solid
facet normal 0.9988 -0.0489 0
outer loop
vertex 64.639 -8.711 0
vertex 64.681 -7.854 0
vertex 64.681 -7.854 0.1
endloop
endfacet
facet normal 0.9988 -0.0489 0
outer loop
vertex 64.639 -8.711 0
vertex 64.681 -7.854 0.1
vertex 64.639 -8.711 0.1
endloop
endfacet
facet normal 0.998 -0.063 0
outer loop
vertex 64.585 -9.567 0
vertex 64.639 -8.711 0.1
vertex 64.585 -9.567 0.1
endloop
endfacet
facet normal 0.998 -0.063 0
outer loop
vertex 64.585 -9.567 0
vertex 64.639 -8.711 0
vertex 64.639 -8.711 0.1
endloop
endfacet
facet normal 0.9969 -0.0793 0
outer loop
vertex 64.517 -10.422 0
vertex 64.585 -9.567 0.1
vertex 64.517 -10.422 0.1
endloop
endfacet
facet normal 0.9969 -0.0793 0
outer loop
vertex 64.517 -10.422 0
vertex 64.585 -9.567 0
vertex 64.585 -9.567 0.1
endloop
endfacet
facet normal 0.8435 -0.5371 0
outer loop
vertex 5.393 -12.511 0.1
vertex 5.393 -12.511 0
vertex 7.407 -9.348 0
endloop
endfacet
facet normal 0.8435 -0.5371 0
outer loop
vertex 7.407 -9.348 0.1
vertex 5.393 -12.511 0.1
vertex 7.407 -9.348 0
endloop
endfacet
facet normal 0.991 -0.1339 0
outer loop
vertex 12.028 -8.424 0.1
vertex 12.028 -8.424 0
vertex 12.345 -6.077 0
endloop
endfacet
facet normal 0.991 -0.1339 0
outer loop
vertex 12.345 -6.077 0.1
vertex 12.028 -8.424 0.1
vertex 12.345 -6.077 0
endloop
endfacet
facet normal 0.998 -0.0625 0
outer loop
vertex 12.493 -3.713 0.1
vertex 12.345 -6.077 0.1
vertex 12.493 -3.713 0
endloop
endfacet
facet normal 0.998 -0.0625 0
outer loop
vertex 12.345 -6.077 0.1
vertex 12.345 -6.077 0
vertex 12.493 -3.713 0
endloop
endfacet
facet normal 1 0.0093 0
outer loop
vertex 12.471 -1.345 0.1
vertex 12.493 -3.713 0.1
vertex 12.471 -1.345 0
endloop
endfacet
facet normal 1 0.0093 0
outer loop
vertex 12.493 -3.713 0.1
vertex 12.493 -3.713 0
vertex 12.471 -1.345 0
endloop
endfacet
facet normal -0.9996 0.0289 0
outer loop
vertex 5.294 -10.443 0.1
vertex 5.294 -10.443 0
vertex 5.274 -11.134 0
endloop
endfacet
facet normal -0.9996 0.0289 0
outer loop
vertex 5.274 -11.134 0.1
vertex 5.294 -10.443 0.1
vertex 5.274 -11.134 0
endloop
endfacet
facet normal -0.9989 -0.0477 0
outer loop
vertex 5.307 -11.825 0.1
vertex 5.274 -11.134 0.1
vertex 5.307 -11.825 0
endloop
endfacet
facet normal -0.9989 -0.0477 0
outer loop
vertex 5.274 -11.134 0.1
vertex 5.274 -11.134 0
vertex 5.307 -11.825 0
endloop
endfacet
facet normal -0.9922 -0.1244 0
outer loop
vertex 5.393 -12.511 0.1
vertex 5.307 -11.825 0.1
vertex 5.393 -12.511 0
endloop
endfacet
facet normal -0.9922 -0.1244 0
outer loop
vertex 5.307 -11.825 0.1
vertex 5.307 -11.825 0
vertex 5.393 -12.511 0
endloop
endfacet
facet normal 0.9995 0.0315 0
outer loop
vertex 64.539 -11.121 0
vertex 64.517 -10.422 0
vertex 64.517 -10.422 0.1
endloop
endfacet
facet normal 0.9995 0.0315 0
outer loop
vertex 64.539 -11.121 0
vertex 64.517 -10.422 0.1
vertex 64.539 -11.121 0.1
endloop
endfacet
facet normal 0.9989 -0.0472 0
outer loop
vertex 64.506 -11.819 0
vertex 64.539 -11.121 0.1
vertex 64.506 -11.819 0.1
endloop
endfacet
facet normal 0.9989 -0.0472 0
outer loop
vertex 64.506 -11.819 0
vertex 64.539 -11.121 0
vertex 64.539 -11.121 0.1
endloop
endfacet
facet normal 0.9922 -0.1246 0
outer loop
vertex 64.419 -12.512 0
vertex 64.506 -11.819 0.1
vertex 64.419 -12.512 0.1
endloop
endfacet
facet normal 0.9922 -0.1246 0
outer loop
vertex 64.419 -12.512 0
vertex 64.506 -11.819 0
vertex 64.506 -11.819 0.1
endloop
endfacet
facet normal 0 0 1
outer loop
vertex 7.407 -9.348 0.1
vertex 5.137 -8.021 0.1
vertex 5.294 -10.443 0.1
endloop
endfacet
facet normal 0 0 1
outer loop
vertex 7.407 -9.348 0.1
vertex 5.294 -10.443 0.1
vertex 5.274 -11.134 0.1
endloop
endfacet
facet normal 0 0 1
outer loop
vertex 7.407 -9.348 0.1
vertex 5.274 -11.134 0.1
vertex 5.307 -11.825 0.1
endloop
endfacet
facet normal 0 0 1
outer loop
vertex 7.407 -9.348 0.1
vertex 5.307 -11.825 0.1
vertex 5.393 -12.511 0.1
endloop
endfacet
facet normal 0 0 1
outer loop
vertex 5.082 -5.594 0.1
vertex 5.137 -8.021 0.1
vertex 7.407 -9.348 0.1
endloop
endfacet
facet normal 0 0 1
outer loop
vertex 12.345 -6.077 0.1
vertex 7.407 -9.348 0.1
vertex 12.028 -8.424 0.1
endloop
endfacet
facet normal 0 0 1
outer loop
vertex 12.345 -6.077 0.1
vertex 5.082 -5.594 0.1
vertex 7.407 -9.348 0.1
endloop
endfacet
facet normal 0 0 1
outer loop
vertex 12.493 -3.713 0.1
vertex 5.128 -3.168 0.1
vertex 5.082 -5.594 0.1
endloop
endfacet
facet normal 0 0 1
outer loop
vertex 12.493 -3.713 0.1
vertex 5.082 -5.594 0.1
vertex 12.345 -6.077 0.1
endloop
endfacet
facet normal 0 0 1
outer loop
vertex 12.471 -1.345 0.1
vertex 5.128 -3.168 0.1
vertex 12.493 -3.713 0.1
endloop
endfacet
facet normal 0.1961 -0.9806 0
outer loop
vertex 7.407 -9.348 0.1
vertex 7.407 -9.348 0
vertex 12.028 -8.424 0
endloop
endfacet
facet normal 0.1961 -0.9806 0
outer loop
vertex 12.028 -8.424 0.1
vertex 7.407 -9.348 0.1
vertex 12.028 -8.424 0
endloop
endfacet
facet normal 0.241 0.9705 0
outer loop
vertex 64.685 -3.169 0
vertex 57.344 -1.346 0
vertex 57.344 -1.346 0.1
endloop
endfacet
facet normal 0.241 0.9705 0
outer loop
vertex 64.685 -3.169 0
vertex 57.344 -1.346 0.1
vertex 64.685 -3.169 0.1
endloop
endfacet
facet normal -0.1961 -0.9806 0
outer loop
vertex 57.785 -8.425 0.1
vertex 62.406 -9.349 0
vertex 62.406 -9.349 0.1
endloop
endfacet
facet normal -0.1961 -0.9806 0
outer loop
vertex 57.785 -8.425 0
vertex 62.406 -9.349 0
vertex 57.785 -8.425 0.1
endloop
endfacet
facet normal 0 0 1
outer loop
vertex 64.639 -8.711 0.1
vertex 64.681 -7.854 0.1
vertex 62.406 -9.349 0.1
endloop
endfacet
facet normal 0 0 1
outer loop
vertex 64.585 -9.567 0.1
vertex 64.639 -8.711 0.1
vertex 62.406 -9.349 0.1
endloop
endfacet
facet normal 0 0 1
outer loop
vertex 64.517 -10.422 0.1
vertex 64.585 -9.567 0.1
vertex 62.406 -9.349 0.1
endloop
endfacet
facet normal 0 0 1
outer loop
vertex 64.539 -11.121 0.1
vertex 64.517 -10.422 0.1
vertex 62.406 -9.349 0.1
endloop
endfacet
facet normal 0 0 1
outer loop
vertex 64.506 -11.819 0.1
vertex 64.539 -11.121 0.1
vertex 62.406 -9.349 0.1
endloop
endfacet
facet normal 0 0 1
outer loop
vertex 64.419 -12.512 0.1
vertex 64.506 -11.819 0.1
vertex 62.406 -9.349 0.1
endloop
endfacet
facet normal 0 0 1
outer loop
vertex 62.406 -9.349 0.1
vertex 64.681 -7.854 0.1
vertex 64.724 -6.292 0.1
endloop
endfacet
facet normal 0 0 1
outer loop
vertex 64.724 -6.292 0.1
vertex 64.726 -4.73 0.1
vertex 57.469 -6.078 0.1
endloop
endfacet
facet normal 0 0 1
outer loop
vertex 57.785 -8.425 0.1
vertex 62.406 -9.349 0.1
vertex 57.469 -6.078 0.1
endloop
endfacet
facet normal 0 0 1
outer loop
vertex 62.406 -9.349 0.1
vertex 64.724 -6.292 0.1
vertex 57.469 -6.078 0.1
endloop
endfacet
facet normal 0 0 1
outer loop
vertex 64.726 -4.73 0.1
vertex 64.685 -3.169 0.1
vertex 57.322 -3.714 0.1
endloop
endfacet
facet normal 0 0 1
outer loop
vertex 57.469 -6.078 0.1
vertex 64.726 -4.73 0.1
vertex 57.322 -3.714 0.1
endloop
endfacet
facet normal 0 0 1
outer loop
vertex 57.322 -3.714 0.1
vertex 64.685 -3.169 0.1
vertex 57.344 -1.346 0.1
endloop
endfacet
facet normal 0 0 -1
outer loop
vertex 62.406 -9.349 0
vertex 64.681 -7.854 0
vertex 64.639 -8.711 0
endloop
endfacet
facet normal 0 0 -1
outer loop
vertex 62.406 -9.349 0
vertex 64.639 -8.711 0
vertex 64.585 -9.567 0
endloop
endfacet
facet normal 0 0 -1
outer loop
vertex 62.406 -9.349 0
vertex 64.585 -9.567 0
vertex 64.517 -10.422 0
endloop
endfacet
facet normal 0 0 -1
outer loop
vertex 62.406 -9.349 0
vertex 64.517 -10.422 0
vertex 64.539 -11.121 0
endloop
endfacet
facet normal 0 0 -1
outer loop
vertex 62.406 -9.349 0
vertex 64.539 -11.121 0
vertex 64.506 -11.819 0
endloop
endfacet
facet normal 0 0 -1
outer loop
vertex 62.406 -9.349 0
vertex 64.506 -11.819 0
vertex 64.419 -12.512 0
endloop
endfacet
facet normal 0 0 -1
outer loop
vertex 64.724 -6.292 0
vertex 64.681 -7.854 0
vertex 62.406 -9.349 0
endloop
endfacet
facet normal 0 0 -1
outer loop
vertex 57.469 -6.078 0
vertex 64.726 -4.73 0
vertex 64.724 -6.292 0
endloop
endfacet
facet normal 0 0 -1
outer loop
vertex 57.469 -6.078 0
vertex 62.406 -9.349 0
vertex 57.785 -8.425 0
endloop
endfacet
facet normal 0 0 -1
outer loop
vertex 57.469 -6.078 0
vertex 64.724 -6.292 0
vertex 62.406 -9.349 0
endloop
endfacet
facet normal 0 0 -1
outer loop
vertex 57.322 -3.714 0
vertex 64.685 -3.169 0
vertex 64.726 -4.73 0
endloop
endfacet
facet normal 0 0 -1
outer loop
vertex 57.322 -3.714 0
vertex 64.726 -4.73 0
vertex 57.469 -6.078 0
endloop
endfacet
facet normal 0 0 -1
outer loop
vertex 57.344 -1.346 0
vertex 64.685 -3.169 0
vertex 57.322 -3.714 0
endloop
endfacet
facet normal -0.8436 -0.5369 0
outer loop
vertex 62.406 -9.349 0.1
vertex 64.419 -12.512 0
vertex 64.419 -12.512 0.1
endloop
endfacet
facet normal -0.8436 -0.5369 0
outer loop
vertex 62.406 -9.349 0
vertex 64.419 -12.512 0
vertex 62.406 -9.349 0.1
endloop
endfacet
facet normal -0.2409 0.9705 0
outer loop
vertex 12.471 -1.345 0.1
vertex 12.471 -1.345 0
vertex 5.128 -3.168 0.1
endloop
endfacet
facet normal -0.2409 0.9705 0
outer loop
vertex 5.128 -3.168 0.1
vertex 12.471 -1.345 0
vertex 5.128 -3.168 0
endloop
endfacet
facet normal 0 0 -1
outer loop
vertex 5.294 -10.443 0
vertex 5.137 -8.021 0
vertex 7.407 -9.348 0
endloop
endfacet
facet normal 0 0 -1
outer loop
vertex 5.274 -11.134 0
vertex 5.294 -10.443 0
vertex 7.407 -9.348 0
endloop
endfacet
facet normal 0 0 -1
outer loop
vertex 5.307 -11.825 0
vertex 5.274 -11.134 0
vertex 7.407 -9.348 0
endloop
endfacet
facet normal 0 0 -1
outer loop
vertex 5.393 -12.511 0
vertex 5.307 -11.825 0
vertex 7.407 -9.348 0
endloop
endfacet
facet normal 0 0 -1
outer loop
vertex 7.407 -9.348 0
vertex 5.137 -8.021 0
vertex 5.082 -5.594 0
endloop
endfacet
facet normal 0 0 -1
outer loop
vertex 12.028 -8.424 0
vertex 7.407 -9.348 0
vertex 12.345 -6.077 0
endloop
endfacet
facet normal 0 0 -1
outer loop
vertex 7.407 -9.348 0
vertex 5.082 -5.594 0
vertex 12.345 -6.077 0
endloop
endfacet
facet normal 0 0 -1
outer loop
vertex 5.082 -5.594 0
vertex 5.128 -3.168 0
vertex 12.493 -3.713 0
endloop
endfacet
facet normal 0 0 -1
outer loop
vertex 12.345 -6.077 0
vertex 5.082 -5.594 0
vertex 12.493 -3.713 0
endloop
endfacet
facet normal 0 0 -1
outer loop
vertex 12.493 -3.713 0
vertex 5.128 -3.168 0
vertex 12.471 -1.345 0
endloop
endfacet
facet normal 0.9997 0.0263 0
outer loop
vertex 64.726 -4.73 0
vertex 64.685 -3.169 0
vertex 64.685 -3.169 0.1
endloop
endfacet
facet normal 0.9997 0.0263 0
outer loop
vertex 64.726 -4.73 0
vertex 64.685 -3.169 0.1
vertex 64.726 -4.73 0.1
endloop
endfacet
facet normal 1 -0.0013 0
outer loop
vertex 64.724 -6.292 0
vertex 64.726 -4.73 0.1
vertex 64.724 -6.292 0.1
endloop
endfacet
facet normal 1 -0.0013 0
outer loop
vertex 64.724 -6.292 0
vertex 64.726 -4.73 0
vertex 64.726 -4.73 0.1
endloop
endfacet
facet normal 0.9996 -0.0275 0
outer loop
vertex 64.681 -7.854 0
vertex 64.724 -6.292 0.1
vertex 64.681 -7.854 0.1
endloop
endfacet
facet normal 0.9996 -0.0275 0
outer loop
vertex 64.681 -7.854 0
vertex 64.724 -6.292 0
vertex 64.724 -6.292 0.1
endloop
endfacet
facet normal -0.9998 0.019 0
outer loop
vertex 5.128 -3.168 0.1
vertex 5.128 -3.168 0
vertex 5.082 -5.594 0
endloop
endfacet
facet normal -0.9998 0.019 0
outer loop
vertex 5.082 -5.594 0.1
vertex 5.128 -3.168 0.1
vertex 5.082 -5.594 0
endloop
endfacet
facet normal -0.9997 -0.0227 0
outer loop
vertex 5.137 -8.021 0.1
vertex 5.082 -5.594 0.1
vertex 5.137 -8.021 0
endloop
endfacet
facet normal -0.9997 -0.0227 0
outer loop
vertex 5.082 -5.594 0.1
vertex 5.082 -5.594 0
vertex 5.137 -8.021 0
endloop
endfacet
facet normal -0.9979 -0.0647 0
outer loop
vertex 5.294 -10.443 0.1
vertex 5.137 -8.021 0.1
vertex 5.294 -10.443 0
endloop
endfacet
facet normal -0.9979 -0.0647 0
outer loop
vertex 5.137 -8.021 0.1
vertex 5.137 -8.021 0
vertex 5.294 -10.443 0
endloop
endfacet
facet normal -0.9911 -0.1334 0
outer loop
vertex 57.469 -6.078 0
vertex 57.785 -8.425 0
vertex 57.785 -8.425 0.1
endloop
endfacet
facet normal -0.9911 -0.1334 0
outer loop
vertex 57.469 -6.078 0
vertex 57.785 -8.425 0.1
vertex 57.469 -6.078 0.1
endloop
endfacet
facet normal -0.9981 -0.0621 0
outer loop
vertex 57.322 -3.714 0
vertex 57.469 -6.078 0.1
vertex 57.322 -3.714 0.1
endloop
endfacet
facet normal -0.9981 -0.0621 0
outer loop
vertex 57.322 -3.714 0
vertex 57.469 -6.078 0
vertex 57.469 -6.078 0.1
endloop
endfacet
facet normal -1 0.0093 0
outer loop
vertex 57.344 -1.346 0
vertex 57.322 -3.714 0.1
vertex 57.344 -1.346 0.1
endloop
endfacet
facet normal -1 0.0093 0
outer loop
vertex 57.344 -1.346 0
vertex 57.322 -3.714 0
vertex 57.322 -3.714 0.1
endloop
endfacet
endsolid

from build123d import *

# Parameters (mm, degrees)
SALIENTE_EXTRUIR1_DEPTH   = 0.1
SALIENTE_EXTRUIR1_2_DEPTH = 0.1


with BuildPart() as part:
    # Model → Saliente-Extruir1 (new body)
    with BuildSketch(Plane.XY):
        with BuildLine():
            Line((12.47051214, -1.34518661), (5.128289663, -3.167523437))
            ThreePointArc((5.128289663, -3.167523437), (5.096779394, -6.807884745), (5.293853737, -10.443044309))
            ThreePointArc((5.293853737, -10.443044309), (5.28344692, -11.479936915), (5.393218826, -12.511055097))
            Line((5.393218826, -12.511055097), (7.406998009, -9.347871018))
            Line((7.406998009, -9.347871018), (12.027985323, -8.423835121))
            ThreePointArc((12.027985323, -8.423835121), (12.440406197, -4.896461212), (12.47051214, -1.34518661))
        make_face()
    extrude(amount=SALIENTE_EXTRUIR1_DEPTH)


with BuildPart() as body_2:
    # Model → Saliente-Extruir1 2 (new body)
    with BuildSketch(Plane.XY):
        with BuildLine():
            Line((57.344273363, -1.346019767), (64.684709921, -3.168524547))
            ThreePointArc((64.684709921, -3.168524547), (64.730344073, -5.511351893), (64.680968663, -7.854103378))
            ThreePointArc((64.680968663, -7.854103378), (64.613474445, -9.139037986), (64.517391056, -10.422151543))
            ThreePointArc((64.517391056, -10.422151543), (64.529583716, -11.469964899), (64.41946664, -12.512047295))
            Line((64.41946664, -12.512047295), (62.4057938, -9.348795516))
            Line((62.4057938, -9.348795516), (57.784837554, -8.424604267))
            ThreePointArc((57.784837554, -8.424604267), (57.374583379, -4.897135694), (57.344273363, -1.346019767))
        make_face()
    extrude(amount=SALIENTE_EXTRUIR1_2_DEPTH)


solid = Compound([part.part, body_2.part])
